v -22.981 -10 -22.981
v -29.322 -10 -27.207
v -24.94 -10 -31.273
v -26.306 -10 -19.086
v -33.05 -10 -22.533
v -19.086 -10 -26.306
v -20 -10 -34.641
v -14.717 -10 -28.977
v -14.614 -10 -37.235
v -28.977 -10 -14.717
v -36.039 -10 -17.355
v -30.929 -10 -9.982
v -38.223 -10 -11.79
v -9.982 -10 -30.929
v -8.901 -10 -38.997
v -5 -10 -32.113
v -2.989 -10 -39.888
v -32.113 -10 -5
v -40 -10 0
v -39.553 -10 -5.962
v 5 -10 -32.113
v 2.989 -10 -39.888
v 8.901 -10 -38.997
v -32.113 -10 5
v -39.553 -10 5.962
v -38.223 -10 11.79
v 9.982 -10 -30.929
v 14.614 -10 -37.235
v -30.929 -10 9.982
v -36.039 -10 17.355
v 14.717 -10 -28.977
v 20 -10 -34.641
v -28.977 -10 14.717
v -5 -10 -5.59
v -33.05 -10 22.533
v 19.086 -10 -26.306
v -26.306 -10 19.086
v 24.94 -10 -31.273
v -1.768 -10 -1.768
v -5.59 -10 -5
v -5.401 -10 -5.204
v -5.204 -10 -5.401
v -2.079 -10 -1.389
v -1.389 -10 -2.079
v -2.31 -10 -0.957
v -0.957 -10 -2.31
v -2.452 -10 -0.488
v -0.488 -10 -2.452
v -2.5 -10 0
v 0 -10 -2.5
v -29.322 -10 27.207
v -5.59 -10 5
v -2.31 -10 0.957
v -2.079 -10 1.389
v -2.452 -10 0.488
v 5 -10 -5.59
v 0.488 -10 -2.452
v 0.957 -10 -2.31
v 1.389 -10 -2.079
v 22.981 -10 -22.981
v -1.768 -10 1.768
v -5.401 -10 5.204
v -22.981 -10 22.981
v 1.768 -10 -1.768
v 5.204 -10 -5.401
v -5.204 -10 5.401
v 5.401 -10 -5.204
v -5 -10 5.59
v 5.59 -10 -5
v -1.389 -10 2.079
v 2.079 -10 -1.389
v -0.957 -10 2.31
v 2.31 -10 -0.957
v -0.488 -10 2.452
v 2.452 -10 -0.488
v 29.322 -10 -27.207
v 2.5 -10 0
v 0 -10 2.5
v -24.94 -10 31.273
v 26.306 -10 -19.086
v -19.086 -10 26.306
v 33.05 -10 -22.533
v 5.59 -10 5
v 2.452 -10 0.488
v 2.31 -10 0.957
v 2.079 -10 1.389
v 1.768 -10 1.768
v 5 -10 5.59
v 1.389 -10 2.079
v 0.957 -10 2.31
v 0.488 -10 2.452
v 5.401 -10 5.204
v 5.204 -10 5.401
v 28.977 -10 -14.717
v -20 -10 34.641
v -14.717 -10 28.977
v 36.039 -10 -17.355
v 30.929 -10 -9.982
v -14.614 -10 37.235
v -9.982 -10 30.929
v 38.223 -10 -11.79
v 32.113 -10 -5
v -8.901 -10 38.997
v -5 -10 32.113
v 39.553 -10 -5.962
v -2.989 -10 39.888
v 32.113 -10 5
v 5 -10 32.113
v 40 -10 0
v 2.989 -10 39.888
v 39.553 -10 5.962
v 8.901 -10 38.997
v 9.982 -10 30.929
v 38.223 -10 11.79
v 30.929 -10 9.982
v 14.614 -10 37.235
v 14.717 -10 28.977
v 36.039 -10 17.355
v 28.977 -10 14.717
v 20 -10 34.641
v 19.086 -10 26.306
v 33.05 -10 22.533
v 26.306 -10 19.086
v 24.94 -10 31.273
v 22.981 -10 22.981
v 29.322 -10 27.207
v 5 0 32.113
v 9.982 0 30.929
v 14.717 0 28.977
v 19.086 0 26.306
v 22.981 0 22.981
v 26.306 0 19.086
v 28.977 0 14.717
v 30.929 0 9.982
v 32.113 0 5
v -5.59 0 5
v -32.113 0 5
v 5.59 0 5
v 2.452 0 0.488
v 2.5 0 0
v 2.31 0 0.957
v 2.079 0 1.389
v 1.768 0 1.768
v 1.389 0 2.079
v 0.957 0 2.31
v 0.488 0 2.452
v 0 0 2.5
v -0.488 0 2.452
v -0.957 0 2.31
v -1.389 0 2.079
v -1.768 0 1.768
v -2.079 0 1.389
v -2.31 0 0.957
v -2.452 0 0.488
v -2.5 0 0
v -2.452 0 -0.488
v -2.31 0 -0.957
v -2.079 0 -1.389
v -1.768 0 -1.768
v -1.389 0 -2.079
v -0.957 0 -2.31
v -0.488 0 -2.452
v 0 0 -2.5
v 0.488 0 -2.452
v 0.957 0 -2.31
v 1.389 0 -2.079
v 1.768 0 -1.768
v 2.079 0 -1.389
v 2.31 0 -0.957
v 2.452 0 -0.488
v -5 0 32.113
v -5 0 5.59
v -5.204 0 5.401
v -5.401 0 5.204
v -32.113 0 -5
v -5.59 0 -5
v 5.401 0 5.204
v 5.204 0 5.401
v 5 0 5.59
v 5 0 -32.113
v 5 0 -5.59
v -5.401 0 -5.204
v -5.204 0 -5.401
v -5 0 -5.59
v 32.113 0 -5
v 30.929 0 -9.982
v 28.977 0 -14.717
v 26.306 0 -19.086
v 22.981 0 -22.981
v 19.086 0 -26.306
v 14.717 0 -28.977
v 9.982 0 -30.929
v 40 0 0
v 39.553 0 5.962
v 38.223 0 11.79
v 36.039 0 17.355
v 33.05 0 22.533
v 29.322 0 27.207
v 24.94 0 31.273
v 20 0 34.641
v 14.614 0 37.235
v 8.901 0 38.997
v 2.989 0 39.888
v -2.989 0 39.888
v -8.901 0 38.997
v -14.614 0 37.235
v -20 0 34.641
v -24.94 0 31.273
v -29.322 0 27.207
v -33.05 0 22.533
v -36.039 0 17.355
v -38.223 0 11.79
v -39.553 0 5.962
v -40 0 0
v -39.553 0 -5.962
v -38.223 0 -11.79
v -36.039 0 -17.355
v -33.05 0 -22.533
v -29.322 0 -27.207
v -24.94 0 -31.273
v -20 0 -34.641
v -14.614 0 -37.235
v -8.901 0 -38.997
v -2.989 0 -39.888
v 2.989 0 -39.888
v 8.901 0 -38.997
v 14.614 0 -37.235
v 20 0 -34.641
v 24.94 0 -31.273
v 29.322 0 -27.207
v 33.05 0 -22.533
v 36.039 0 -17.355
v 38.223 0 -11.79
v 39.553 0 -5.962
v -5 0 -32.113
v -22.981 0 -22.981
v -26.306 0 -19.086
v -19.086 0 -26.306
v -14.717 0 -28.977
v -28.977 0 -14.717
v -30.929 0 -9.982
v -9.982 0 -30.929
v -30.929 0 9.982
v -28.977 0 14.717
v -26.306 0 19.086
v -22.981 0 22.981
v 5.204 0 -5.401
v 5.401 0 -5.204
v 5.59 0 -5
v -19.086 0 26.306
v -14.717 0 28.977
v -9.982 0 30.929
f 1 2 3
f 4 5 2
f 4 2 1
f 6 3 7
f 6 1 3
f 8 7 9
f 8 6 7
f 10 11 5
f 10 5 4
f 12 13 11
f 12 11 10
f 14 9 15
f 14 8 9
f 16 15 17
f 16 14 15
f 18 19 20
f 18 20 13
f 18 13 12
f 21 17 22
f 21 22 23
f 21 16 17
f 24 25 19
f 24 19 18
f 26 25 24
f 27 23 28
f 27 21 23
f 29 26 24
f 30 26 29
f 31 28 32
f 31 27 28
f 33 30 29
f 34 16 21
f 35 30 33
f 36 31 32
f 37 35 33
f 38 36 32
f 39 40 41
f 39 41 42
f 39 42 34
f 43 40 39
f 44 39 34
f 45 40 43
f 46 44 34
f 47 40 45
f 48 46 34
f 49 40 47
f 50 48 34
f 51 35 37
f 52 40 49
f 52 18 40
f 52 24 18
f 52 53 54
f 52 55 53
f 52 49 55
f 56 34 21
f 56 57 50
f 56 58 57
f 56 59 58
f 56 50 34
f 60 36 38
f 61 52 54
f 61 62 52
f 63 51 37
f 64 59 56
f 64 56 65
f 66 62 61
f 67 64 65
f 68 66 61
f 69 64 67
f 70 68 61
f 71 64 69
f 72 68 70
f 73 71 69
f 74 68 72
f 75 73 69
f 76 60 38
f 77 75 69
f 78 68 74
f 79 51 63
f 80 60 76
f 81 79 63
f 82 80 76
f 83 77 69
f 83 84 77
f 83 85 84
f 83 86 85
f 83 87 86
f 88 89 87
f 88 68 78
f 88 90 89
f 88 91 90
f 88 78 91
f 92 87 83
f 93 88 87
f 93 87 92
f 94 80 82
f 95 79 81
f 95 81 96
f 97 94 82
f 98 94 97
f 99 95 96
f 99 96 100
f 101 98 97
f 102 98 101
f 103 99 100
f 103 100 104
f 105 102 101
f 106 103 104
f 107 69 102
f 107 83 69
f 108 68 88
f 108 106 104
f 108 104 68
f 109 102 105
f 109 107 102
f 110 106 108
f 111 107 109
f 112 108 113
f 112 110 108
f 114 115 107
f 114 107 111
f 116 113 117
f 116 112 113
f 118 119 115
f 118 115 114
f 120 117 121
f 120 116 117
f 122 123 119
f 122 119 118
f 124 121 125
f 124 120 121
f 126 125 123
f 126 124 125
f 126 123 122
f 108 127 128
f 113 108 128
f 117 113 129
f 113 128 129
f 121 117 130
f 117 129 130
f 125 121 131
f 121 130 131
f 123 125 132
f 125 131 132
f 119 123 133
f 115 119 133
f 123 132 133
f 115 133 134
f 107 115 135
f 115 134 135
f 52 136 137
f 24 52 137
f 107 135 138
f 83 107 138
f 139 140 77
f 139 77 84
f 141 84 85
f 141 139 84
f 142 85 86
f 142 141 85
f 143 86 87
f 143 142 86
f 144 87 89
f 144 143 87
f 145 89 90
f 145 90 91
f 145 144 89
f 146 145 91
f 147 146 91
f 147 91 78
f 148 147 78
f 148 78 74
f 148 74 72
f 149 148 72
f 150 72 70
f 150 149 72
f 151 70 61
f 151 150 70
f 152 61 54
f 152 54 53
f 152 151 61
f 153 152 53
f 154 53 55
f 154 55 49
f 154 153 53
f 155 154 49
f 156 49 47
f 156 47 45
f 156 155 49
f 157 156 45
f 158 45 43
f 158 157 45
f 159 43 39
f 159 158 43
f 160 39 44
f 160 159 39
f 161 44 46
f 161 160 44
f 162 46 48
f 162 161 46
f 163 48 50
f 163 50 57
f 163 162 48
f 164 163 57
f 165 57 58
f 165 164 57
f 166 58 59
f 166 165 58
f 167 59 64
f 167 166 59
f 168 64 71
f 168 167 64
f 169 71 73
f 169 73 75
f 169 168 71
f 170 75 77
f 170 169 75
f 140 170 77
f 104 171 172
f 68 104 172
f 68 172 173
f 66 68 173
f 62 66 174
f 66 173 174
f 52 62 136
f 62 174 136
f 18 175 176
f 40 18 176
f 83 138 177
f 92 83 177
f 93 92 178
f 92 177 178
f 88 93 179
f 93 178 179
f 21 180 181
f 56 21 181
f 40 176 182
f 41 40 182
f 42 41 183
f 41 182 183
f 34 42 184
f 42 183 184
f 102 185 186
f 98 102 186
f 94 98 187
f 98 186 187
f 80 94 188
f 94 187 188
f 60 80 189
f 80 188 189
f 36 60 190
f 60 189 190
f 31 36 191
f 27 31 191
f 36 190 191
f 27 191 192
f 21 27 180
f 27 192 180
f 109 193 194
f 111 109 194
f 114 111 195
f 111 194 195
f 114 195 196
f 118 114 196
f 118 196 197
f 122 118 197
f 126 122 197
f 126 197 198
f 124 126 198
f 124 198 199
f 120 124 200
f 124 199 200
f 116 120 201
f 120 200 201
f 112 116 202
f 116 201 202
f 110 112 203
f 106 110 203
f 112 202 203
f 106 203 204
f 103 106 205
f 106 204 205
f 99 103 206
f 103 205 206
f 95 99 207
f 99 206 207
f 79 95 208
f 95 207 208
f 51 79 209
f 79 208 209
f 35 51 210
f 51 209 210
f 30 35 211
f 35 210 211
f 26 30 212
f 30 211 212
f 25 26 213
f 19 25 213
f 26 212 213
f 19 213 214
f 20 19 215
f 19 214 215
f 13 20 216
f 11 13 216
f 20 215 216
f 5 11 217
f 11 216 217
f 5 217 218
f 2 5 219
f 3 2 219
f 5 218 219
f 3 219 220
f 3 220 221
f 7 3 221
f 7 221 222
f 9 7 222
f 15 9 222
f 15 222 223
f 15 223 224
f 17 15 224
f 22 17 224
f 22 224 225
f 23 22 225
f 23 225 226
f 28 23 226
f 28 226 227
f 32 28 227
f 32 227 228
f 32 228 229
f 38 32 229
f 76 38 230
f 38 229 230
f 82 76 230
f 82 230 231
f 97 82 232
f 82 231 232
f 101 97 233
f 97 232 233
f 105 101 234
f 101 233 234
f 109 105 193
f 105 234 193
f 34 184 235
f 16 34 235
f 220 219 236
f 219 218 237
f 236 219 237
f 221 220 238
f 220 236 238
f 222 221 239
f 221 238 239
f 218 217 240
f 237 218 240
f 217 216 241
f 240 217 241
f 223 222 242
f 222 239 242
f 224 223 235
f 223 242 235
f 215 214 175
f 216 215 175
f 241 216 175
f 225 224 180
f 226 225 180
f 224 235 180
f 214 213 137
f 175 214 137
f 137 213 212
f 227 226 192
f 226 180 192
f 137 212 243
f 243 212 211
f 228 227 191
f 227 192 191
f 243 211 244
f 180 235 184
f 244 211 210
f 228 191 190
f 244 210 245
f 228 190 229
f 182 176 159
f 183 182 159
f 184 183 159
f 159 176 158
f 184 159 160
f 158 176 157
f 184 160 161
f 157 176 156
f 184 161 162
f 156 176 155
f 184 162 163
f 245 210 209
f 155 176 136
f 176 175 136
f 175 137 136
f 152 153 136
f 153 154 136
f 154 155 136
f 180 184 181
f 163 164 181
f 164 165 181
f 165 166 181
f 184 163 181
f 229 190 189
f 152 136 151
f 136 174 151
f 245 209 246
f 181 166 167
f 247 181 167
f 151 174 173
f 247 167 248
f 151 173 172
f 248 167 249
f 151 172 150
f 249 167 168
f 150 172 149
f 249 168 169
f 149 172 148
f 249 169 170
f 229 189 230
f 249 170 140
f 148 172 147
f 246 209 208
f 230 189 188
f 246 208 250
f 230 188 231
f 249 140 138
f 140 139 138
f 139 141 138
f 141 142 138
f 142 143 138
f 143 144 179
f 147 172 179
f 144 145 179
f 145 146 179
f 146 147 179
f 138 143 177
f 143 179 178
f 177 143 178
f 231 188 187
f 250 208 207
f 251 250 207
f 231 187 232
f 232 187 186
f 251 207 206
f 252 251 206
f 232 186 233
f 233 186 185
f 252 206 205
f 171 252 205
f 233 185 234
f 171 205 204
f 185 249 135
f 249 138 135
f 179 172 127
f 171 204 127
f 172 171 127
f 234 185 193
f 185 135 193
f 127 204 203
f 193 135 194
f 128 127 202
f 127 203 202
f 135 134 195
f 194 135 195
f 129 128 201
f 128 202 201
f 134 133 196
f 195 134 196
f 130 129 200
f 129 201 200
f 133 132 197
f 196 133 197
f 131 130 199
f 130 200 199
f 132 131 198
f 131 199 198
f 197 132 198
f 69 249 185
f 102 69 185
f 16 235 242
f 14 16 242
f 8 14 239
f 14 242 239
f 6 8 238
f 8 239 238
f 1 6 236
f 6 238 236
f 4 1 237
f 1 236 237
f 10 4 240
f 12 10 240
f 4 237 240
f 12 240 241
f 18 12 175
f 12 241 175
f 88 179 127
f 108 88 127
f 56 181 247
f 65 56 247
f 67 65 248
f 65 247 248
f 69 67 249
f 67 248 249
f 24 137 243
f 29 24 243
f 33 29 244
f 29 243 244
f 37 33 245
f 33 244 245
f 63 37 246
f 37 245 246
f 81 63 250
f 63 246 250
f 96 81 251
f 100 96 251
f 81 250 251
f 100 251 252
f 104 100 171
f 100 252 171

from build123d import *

# Parameters (mm, degrees)
F0_R     = 40
F0_R_2   = 2.5
F1_DEPTH = 10


with BuildPart() as f1:
    # F0 (on Front) → F1 (new body)
    with BuildSketch(Plane.XZ):
        Circle(F0_R)
        with BuildLine():
            ThreePointArc((-5.59017, -5), (-5.303301, -5.303301), (-5, -5.59017))
            Line((-5, -5.59017), (-5, -32.113081))
            ThreePointArc((-5, -32.113081), (-22.98097, -22.98097), (-32.113081, -5))
            Line((-32.113081, -5), (-5.59017, -5))
        make_face(mode=Mode.SUBTRACT)
        with BuildLine():
            Line((5.59017, -5), (32.113081, -5))
            ThreePointArc((32.113081, -5), (22.98097, -22.98097), (5, -32.113081))
            Line((5, -32.113081), (5, -5.59017))
            ThreePointArc((5, -5.59017), (5.303301, -5.303301), (5.59017, -5))
        make_face(mode=Mode.SUBTRACT)
        with BuildLine():
            ThreePointArc((-32.113081, 5), (-22.98097, 22.98097), (-5, 32.113081))
            Line((-5, 32.113081), (-5, 5.59017))
            ThreePointArc((-5, 5.59017), (-5.303301, 5.303301), (-5.59017, 5))
            Line((-5.59017, 5), (-32.113081, 5))
        make_face(mode=Mode.SUBTRACT)
        Circle(F0_R_2, mode=Mode.SUBTRACT)
        with BuildLine():
            Line((32.113081, 5), (5.59017, 5))
            ThreePointArc((5.59017, 5), (5.303301, 5.303301), (5, 5.59017))
            Line((5, 5.59017), (5, 32.113081))
            ThreePointArc((5, 32.113081), (22.98097, 22.98097), (32.113081, 5))
        make_face(mode=Mode.SUBTRACT)
    extrude(amount=F1_DEPTH)


solid = f1.part
